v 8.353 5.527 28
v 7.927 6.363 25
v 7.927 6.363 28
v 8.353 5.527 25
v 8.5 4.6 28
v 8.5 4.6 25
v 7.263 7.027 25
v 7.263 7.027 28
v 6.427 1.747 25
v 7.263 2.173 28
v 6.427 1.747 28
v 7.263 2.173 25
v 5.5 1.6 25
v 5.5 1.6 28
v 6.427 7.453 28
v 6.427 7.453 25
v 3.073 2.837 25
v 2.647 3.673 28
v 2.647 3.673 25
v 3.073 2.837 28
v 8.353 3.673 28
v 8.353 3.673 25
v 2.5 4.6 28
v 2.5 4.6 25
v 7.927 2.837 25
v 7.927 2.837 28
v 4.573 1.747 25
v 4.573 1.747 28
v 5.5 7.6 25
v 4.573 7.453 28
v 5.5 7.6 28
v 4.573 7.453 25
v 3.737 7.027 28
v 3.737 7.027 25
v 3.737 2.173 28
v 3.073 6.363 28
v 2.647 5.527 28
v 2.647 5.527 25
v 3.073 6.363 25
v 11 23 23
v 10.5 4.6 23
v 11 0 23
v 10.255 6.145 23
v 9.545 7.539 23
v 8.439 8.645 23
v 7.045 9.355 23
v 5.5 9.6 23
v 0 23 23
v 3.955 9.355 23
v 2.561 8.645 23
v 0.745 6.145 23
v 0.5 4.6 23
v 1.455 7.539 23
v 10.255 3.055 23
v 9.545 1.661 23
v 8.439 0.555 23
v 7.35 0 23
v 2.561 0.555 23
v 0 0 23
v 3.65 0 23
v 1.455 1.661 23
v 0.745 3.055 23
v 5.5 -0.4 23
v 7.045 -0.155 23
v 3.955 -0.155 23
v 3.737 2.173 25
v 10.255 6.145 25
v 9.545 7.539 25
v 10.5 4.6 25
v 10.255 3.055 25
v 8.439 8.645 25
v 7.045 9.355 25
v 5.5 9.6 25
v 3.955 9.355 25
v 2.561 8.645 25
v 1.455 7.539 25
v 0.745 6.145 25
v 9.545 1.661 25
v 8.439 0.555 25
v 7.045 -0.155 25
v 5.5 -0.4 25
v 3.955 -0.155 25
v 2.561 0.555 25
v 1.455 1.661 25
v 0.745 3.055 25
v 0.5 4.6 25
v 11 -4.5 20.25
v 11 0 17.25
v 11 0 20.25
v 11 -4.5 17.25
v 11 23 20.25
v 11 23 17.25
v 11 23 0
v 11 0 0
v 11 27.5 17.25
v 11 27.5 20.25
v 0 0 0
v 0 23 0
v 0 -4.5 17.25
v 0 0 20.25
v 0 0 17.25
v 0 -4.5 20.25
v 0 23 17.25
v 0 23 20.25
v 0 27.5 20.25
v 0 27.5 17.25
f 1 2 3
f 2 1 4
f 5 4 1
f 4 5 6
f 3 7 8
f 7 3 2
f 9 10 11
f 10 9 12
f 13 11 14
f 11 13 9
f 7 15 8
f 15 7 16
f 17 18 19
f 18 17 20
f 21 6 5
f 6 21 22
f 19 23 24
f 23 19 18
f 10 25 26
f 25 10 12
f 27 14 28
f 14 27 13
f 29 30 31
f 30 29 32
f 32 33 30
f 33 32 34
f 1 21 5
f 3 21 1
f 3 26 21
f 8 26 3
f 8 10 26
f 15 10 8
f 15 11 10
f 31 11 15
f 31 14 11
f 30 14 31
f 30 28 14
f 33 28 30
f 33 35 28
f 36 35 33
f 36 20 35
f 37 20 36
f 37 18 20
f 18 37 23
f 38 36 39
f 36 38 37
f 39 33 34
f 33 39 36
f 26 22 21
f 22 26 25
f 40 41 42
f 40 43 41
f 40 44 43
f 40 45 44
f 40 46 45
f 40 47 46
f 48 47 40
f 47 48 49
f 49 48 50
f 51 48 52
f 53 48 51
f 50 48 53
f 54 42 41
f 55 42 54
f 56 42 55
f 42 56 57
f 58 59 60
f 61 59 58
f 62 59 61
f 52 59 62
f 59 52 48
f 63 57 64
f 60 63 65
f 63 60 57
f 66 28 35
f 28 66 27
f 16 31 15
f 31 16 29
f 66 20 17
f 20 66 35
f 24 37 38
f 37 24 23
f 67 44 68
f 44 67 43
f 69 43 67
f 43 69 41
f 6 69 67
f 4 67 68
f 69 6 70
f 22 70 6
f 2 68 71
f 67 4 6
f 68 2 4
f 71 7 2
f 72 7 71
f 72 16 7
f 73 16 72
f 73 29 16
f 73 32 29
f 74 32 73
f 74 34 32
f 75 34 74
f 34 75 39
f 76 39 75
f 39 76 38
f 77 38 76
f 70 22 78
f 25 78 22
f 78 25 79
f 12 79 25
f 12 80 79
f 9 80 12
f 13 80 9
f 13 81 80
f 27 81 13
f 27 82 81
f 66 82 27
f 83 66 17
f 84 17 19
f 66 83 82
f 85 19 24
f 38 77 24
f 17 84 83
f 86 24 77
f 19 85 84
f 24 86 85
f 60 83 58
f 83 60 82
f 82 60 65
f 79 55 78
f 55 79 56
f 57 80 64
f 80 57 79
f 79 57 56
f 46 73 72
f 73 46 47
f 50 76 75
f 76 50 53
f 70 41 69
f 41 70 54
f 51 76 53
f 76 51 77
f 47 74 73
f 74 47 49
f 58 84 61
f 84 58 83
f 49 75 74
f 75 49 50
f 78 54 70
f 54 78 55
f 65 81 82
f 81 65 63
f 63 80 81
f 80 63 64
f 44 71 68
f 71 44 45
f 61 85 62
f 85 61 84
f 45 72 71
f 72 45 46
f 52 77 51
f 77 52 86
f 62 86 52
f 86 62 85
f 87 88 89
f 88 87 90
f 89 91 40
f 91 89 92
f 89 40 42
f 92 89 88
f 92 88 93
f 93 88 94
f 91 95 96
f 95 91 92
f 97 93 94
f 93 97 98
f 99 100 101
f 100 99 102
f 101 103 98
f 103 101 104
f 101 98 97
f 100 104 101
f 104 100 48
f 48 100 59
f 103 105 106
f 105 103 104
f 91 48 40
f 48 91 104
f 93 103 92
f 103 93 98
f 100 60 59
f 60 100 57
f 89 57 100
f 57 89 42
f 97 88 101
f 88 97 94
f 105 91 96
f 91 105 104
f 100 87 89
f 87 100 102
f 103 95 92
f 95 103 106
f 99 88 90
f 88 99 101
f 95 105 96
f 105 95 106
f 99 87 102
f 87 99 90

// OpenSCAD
servo_x=11;
servo_y=23;
servo_z=23;
servo_mount_x=11;
servo_mount_y=32;
servo_mount_z=3;
mount_rad=1.5;
servo_shaft_x=0.5*servo_x;
servo_shaft_y=0.2*servo_y;
servo_r=3;
servo_h=3;



fn=64;

$fn =20;

module servo(){
    
    
    color("white")translate([servo_shaft_x,servo_shaft_y,servo_z])cylinder(r=servo_r,h=servo_h+2);
    
    color("blue")translate([servo_shaft_x,servo_shaft_y,servo_z])cylinder(r=5,h=2);
    
    color("blue")cube([servo_x,servo_y,servo_z]);
    color("blue")translate([0,-0.5*(servo_mount_y-servo_y),servo_z*0.75])render()difference(){
        
     cube([servo_mount_x,servo_mount_y,servo_mount_z]);
        //translate([0.5*servo_mount_x,0.25*(servo_mount_y-servo_y),0])cylinder(r=mount_rad,h=10);
       // translate([0.75*servo_mount_x,0.25*(servo_mount_y-servo_y),0])cylinder(r=mount_rad,h=10);
        
        //translate([0.5*servo_mount_x,servo_mount_y-0.25*(servo_mount_y-servo_y),0])cylinder(r=mount_rad,h=10);
        
    }
}    


servo();
